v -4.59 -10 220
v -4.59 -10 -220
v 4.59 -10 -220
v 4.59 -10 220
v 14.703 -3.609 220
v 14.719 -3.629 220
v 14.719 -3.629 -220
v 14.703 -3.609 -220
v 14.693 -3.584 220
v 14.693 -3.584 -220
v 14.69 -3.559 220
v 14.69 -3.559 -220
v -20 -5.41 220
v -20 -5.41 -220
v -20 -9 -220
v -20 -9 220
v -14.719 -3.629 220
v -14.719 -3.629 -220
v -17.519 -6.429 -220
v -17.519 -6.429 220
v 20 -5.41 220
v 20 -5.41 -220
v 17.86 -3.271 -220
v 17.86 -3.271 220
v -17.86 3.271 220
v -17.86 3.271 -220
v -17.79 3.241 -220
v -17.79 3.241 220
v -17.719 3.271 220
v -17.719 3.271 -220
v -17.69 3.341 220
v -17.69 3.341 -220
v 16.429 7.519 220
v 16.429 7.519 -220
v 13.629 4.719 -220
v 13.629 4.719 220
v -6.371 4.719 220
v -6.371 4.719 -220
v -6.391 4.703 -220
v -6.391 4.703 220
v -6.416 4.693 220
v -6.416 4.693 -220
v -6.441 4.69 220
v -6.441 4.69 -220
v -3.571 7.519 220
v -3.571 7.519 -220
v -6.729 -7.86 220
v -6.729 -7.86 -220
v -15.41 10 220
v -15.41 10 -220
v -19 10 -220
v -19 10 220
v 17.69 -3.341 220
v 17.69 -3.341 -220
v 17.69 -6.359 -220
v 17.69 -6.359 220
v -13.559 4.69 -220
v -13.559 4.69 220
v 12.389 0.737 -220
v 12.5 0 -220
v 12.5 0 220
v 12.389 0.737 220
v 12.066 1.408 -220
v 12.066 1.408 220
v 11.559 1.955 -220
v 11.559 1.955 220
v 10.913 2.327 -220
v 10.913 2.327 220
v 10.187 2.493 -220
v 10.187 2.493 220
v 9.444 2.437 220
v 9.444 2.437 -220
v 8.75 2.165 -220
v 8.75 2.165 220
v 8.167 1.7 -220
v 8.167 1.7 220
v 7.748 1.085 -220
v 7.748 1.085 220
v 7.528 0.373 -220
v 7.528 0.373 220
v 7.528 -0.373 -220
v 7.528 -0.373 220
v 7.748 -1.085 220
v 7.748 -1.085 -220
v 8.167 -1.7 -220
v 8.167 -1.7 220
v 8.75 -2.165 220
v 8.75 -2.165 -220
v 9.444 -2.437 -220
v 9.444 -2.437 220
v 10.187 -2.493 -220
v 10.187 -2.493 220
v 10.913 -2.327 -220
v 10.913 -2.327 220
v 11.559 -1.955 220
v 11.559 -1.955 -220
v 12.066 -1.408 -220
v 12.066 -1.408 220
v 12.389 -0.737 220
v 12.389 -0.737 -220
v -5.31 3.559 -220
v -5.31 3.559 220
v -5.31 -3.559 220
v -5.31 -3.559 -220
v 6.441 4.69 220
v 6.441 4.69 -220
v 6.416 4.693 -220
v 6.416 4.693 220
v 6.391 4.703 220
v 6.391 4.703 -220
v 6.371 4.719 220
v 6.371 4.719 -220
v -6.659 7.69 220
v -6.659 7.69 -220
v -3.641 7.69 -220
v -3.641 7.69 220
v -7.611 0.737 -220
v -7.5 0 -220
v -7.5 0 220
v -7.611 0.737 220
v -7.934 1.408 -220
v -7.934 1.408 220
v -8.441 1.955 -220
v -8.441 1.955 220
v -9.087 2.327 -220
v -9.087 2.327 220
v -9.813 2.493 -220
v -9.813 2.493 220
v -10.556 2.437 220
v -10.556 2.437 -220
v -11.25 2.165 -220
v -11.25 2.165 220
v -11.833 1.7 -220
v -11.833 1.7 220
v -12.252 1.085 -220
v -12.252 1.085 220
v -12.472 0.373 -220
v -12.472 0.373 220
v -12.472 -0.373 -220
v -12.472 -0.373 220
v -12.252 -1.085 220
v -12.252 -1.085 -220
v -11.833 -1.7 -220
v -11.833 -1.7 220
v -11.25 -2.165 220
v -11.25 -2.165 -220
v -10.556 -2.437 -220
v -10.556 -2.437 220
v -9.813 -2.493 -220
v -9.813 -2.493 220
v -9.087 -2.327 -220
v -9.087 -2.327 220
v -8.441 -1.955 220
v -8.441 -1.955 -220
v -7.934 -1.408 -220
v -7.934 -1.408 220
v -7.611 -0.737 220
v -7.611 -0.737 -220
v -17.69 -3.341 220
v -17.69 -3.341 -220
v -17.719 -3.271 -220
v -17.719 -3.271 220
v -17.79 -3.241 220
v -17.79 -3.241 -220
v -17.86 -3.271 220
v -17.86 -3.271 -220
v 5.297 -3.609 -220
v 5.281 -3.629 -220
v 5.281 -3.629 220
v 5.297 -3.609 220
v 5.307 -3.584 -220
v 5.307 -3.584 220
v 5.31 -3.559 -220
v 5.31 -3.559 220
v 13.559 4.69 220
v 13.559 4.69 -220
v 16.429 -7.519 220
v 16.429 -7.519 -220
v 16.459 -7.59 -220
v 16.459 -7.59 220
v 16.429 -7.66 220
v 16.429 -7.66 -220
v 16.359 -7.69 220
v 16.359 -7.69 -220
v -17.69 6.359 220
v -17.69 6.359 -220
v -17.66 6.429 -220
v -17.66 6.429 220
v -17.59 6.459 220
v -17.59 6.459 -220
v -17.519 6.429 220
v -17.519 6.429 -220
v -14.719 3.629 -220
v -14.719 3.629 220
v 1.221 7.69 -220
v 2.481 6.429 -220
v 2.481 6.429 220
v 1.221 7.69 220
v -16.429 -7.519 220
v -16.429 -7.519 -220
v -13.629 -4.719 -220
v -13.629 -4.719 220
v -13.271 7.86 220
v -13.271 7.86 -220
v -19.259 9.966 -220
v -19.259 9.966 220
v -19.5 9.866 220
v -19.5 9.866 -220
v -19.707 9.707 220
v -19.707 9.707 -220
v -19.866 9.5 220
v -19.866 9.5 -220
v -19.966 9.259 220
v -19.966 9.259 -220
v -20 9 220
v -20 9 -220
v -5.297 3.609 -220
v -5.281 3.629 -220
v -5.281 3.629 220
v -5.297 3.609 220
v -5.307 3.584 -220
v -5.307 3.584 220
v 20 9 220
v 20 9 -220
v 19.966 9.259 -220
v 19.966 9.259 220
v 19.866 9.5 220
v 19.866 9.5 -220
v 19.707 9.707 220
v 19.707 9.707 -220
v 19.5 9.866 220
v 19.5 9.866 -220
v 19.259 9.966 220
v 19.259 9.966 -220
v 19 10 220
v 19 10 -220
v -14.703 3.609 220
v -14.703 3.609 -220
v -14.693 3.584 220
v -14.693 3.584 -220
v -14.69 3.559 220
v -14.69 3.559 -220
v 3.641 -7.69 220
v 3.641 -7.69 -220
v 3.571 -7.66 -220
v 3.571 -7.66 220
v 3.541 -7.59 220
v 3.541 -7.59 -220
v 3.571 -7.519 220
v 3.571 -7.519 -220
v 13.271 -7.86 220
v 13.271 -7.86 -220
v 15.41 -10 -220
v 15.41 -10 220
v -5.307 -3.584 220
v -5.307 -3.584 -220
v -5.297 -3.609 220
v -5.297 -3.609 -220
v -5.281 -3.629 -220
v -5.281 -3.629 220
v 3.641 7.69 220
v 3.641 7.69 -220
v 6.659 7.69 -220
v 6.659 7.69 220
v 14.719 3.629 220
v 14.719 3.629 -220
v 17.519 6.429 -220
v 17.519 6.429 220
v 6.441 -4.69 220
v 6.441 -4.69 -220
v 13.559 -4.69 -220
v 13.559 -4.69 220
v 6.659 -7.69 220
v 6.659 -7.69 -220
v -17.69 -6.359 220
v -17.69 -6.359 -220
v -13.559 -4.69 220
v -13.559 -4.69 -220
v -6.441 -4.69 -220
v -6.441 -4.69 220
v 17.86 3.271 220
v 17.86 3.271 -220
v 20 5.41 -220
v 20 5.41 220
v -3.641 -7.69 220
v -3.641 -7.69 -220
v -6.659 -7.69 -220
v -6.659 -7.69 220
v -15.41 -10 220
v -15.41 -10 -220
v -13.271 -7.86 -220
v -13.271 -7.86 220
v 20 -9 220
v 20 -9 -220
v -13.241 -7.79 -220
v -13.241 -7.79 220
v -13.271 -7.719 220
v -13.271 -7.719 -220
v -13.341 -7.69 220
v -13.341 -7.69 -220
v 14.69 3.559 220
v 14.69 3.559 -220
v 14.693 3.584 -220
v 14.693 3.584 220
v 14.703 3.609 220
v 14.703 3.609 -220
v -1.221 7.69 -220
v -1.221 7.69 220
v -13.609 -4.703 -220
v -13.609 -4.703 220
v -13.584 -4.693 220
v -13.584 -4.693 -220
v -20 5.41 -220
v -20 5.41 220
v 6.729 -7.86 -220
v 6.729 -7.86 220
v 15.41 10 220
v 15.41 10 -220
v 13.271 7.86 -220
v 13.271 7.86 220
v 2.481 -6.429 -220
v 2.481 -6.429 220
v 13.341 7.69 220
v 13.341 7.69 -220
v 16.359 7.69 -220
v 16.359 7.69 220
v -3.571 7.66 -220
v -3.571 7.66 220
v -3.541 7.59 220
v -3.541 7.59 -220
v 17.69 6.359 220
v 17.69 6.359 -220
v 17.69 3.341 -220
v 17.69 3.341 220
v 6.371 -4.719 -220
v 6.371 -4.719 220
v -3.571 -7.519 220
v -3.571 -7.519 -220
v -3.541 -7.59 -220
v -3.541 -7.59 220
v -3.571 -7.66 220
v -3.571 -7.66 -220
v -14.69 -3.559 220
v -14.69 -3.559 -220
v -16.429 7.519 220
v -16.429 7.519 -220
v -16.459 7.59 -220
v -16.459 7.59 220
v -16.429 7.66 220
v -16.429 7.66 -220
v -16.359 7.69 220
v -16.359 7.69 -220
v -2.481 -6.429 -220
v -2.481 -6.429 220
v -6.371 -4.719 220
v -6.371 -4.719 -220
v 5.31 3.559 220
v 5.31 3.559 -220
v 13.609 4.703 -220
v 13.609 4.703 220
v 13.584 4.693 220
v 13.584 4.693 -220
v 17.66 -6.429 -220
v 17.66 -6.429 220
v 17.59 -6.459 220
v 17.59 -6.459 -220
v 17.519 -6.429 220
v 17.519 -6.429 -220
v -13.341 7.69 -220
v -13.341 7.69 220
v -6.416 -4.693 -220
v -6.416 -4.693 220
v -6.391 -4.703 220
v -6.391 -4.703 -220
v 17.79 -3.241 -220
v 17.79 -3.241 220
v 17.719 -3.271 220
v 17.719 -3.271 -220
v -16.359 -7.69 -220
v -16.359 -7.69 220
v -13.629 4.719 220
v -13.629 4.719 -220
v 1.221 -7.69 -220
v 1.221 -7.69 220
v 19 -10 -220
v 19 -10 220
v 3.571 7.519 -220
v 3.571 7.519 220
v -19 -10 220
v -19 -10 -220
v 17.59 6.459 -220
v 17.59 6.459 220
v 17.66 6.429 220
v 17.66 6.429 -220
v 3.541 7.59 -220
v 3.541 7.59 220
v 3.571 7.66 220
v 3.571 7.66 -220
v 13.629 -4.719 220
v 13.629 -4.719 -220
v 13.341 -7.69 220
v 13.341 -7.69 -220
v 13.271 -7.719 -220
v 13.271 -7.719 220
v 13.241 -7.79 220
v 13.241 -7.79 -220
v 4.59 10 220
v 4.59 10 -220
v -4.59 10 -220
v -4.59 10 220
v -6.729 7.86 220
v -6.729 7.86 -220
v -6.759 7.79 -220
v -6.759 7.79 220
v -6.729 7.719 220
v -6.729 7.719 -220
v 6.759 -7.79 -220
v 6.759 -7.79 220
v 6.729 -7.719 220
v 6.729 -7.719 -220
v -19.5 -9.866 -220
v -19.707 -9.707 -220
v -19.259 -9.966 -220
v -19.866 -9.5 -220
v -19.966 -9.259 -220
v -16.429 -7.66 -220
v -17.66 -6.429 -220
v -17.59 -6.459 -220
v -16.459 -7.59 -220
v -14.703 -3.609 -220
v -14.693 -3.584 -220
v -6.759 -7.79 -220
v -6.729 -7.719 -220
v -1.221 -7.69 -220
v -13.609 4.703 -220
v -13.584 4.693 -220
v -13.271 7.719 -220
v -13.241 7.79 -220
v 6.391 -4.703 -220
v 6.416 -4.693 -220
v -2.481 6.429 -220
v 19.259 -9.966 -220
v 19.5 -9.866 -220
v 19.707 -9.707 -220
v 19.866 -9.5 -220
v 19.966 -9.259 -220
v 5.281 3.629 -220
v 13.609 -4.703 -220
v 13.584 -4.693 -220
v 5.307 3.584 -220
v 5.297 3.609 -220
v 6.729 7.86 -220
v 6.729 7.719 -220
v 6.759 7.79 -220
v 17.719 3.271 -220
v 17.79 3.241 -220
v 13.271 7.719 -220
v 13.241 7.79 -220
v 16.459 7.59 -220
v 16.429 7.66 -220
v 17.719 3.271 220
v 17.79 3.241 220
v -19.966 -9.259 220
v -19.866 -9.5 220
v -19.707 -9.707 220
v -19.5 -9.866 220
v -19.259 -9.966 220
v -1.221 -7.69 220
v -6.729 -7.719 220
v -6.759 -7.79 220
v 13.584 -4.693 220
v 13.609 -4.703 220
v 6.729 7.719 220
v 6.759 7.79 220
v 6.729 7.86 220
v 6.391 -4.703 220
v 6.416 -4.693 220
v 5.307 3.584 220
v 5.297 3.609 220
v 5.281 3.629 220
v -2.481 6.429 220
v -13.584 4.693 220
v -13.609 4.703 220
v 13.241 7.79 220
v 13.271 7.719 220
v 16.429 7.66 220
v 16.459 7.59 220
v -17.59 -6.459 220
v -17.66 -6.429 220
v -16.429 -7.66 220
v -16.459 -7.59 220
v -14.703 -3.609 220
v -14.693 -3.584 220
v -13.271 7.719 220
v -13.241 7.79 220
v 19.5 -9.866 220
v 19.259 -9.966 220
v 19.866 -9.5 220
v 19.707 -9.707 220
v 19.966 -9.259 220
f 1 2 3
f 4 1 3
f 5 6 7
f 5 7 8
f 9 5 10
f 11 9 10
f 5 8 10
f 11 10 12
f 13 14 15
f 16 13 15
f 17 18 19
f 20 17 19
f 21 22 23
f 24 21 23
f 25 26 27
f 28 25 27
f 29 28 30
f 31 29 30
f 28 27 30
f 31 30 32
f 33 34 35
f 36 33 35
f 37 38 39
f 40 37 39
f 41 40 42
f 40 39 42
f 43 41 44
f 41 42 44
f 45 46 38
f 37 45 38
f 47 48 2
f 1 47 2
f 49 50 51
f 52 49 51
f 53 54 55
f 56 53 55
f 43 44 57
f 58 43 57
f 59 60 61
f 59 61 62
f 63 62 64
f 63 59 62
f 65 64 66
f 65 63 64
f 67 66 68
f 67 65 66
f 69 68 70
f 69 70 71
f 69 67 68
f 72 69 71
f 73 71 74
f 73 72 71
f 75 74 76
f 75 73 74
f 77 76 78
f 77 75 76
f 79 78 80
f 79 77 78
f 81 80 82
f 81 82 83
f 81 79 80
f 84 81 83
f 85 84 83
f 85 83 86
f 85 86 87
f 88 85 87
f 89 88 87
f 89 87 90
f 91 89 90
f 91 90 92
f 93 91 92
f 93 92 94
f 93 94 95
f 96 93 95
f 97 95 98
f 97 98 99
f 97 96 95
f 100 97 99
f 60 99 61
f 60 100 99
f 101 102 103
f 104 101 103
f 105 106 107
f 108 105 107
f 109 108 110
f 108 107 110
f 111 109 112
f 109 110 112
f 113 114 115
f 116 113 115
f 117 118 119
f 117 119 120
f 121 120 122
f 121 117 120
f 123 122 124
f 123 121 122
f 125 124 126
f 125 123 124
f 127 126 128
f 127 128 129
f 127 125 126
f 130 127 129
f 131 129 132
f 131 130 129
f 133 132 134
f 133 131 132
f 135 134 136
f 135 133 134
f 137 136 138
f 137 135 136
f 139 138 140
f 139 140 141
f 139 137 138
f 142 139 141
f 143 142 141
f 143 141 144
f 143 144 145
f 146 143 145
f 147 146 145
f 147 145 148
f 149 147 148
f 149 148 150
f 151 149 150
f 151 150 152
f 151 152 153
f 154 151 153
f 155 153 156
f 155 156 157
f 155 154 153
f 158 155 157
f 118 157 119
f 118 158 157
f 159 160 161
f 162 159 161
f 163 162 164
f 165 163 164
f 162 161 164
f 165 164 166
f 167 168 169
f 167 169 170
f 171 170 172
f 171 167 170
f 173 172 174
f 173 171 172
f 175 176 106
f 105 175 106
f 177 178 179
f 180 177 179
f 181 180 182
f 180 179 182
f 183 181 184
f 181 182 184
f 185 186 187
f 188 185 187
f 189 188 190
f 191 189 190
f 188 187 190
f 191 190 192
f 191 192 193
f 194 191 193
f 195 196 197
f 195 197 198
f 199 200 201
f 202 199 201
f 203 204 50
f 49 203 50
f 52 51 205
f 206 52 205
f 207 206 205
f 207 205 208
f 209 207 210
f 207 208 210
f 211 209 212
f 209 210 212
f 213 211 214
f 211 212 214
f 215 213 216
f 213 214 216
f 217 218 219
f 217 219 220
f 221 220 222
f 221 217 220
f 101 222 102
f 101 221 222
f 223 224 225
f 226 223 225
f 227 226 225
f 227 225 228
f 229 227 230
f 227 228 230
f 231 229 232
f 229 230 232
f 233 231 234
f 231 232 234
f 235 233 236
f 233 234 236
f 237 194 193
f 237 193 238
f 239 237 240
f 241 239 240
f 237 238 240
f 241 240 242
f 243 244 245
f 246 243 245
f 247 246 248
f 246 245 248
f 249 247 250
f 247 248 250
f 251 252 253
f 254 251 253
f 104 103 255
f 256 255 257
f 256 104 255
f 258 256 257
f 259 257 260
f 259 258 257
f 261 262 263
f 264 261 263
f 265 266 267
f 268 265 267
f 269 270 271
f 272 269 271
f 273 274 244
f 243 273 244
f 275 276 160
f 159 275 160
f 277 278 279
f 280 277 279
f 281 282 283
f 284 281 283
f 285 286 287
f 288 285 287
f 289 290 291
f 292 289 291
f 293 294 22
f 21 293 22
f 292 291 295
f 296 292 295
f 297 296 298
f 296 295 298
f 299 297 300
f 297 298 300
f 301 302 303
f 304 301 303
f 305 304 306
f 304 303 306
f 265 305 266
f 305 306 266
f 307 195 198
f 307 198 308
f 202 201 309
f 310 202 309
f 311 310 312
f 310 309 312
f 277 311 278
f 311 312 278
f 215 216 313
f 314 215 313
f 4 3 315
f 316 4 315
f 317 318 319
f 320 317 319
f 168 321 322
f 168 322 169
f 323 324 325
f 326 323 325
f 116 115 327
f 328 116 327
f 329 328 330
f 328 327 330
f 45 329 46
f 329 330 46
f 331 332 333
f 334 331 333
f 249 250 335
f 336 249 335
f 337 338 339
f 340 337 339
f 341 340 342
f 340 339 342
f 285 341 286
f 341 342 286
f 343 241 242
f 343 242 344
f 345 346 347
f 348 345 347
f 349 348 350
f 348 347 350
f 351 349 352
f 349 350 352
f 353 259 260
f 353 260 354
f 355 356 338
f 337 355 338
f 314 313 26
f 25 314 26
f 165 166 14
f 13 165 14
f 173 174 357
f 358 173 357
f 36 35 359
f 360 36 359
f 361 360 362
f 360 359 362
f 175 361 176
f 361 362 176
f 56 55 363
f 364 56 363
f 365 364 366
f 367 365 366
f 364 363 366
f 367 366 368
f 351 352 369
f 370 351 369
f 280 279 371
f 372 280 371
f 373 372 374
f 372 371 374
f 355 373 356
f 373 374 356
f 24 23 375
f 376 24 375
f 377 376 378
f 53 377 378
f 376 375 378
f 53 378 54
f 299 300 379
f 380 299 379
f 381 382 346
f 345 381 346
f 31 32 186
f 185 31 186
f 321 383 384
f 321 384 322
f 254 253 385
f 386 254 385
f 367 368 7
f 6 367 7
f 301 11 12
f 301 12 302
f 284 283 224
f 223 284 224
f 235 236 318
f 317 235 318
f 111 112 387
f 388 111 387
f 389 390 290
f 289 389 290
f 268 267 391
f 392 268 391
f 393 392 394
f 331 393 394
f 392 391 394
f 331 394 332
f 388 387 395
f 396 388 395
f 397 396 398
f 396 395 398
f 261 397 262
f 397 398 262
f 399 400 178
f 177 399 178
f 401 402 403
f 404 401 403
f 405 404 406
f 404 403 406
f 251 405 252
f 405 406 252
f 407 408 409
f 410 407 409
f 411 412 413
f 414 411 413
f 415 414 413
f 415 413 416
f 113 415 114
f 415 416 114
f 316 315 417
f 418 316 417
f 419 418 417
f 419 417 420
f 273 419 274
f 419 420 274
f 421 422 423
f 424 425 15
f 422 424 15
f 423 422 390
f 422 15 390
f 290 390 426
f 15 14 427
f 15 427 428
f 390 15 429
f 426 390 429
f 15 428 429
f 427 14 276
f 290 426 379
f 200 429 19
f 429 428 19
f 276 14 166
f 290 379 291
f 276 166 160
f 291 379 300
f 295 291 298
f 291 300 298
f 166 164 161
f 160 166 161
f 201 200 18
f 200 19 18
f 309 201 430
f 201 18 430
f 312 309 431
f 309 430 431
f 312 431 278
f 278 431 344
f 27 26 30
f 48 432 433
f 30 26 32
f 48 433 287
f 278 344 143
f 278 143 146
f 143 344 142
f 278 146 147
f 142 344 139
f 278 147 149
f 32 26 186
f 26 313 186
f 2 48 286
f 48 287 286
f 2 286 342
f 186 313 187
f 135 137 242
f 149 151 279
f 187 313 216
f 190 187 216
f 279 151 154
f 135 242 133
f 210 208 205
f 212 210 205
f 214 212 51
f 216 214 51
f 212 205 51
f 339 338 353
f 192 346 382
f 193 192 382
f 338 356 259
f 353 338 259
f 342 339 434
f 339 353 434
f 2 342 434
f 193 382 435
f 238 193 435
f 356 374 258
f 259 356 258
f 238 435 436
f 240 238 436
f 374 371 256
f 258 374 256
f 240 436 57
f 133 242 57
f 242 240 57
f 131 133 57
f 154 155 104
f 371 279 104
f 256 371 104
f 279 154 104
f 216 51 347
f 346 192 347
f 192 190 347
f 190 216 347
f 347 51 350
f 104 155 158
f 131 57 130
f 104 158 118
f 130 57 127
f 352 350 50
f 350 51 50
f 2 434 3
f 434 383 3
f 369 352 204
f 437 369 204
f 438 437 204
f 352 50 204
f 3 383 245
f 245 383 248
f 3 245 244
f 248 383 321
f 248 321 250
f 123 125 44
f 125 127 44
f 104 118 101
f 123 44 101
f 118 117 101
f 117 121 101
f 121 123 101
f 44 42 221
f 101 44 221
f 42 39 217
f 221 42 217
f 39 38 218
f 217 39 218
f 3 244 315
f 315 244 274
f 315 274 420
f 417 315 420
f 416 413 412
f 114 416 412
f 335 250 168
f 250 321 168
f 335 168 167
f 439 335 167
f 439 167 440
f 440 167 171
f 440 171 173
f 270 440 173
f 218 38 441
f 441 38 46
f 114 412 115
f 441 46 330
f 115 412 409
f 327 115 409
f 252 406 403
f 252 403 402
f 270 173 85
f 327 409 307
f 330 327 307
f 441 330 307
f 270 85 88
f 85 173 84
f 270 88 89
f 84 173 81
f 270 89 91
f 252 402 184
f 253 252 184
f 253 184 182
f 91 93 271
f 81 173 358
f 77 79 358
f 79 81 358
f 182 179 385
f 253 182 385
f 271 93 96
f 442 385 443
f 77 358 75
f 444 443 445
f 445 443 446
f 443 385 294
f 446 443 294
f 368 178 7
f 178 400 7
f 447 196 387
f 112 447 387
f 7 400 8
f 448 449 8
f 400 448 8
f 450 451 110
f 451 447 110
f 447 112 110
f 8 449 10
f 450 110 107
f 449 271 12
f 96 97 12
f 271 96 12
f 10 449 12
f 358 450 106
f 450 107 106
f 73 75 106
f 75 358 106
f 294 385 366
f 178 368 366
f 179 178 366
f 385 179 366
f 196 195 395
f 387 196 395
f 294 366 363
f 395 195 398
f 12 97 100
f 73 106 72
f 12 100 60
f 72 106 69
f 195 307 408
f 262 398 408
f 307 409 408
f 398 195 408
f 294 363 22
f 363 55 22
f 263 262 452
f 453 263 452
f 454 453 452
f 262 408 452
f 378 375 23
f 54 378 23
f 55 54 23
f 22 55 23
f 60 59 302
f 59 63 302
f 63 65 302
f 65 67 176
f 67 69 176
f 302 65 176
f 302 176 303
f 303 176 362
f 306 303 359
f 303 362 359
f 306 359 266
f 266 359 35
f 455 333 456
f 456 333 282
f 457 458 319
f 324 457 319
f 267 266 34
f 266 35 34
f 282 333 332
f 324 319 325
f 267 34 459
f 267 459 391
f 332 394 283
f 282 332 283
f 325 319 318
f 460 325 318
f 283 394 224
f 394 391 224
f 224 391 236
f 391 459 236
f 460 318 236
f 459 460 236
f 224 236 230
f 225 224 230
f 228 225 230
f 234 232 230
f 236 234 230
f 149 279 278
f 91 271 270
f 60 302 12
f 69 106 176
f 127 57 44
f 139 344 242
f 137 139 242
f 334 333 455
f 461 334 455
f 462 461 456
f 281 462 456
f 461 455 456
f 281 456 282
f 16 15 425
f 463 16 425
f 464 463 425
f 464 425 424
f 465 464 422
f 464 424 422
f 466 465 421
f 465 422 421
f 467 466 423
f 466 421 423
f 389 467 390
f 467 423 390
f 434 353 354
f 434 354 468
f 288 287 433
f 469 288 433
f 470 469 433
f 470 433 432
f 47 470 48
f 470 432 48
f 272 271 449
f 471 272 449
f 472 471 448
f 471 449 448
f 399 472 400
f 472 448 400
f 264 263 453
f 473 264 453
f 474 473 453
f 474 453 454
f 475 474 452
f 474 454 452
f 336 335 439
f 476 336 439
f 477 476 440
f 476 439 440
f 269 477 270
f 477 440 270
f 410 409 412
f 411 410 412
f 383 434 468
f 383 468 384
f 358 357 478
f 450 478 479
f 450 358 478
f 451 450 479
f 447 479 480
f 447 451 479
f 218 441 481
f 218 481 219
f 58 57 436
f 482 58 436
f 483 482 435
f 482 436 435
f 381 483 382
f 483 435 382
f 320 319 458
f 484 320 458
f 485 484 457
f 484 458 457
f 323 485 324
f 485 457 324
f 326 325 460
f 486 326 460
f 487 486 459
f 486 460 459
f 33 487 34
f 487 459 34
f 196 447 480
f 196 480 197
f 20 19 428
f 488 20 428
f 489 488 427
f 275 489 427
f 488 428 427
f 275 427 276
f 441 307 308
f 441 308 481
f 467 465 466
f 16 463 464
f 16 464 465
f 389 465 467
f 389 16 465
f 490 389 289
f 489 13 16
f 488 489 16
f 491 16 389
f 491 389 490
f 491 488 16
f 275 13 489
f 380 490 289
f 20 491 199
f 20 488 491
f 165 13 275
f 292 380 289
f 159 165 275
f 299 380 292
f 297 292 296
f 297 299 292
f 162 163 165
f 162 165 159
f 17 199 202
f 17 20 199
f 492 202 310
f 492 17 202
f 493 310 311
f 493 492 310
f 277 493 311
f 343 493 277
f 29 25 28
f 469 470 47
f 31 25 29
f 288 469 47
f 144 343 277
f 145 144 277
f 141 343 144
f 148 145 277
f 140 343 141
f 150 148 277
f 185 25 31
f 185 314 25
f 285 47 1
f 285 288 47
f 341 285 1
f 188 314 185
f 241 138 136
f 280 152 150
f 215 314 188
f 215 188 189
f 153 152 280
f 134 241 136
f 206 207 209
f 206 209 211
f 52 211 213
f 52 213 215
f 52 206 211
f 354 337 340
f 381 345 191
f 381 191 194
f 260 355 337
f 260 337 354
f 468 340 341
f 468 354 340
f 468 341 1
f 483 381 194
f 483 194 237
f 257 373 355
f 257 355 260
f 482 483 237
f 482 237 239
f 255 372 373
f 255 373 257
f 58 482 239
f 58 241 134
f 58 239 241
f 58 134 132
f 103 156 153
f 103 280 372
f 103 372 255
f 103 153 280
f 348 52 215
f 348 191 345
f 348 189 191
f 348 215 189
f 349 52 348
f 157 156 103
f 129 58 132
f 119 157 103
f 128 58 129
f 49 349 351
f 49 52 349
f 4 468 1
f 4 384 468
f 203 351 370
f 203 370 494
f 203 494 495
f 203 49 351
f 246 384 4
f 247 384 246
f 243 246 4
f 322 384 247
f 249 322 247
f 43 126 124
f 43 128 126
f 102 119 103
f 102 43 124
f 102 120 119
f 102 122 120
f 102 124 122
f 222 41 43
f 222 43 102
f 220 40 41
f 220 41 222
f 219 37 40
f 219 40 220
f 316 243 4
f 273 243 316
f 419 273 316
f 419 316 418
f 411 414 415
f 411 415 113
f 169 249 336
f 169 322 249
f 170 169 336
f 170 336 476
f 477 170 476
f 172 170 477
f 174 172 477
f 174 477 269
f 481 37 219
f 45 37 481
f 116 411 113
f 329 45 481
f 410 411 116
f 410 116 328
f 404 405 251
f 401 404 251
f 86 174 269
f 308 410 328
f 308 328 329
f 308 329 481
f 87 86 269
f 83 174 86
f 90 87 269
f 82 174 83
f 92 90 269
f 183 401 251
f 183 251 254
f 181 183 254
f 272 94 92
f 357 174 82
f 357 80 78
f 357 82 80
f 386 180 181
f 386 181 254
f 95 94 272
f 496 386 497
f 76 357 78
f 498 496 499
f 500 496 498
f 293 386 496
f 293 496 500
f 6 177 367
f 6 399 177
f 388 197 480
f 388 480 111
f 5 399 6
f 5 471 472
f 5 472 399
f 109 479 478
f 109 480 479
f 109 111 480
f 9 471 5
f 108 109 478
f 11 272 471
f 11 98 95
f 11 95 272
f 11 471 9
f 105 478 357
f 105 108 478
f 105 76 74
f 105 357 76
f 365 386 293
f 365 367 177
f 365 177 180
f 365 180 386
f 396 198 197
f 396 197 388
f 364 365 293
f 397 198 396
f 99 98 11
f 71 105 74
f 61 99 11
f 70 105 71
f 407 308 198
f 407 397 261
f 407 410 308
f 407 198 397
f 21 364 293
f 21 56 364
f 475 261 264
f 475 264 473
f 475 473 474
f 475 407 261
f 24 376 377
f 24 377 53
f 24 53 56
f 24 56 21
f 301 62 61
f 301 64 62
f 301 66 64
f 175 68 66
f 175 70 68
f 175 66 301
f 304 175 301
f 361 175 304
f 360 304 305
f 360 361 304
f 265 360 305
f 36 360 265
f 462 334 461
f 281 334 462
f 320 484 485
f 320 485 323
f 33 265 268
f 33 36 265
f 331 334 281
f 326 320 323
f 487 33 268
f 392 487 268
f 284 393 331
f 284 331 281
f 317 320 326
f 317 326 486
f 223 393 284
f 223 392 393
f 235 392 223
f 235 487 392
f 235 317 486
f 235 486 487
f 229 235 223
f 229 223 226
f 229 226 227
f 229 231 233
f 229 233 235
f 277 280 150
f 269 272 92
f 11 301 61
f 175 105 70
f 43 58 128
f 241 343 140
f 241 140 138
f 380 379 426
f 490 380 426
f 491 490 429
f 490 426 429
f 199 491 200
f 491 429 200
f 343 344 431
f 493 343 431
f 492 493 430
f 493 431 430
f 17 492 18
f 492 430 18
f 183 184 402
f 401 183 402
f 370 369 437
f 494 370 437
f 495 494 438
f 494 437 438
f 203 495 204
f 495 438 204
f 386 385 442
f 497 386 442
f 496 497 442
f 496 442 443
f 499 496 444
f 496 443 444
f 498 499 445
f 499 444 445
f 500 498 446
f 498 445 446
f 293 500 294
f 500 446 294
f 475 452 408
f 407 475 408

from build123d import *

# Parameters (mm, degrees)
CROQUIS4_R                 = 2.5
MIEMBRO_ESTRUCTURAL1_DEPTH = 440


with BuildPart() as part:
    # Croquis4 → Miembro estructural1 (new body)
    with BuildSketch(Plane.XY.offset(-220)):
        with BuildLine():
            Line((-19, -10), (-15.410285706, -10))
            Line((-15.410285706, -10), (-13.270710678, -7.860424973))
            ThreePointArc((-13.270710678, -7.860424973), (-13.249033403, -7.751445951), (-13.341421356, -7.689714294))
            Line((-13.341421356, -7.689714294), (-16.358578644, -7.689714294))
            ThreePointArc((-16.358578644, -7.689714294), (-16.450966597, -7.627982638), (-16.429289322, -7.519003616))
            Line((-16.429289322, -7.519003616), (-13.629289322, -4.719003616))
            ThreePointArc((-13.629289322, -4.719003616), (-13.596846987, -4.697326341), (-13.558578644, -4.689714294))
            Line((-13.558578644, -4.689714294), (-6.441421356, -4.689714294))
            ThreePointArc((-6.441421356, -4.689714294), (-6.403153013, -4.697326341), (-6.370710678, -4.719003616))
            Line((-6.370710678, -4.719003616), (-3.570710678, -7.519003616))
            ThreePointArc((-3.570710678, -7.519003616), (-3.549033403, -7.627982638), (-3.641421356, -7.689714294))
            Line((-3.641421356, -7.689714294), (-6.658578644, -7.689714294))
            ThreePointArc((-6.658578644, -7.689714294), (-6.750966597, -7.751445951), (-6.729289322, -7.860424973))
            Line((-6.729289322, -7.860424973), (-4.589714294, -10))
            Line((-4.589714294, -10), (4.589714294, -10))
            Line((4.589714294, -10), (6.729289322, -7.860424973))
            ThreePointArc((6.729289322, -7.860424973), (6.750966597, -7.751445951), (6.658578644, -7.689714294))
            Line((6.658578644, -7.689714294), (3.641421356, -7.689714294))
            ThreePointArc((3.641421356, -7.689714294), (3.549033403, -7.627982638), (3.570710678, -7.519003616))
            Line((3.570710678, -7.519003616), (6.370710678, -4.719003616))
            ThreePointArc((6.370710678, -4.719003616), (6.403153013, -4.697326341), (6.441421356, -4.689714294))
            Line((6.441421356, -4.689714294), (13.558578644, -4.689714294))
            ThreePointArc((13.558578644, -4.689714294), (13.596846987, -4.697326341), (13.629289322, -4.719003616))
            Line((13.629289322, -4.719003616), (16.429289322, -7.519003616))
            ThreePointArc((16.429289322, -7.519003616), (16.450966597, -7.627982638), (16.358578644, -7.689714294))
            Line((16.358578644, -7.689714294), (13.341421356, -7.689714294))
            ThreePointArc((13.341421356, -7.689714294), (13.249033403, -7.751445951), (13.270710678, -7.860424973))
            Line((13.270710678, -7.860424973), (15.410285706, -10))
            Line((15.410285706, -10), (19, -10))
            ThreePointArc((19, -10), (19.707106781, -9.707106781), (20, -9))
            Line((20, -9), (20, -5.410285706))
            Line((20, -5.410285706), (17.860424973, -3.270710678))
            ThreePointArc((17.860424973, -3.270710678), (17.751445951, -3.249033403), (17.689714294, -3.341421356))
            Line((17.689714294, -3.341421356), (17.689714294, -6.358578644))
            ThreePointArc((17.689714294, -6.358578644), (17.627982638, -6.450966597), (17.519003616, -6.429289322))
            Line((17.519003616, -6.429289322), (14.719003616, -3.629289322))
            ThreePointArc((14.719003616, -3.629289322), (14.697326341, -3.596846987), (14.689714294, -3.558578644))
            Line((14.689714294, -3.558578644), (14.689714294, 3.558578644))
            ThreePointArc((14.689714294, 3.558578644), (14.697326341, 3.596846987), (14.719003616, 3.629289322))
            Line((14.719003616, 3.629289322), (17.519003616, 6.429289322))
            ThreePointArc((17.519003616, 6.429289322), (17.627982638, 6.450966597), (17.689714294, 6.358578644))
            Line((17.689714294, 6.358578644), (17.689714294, 3.341421356))
            ThreePointArc((17.689714294, 3.341421356), (17.751445951, 3.249033403), (17.860424973, 3.270710678))
            Line((17.860424973, 3.270710678), (20, 5.410285706))
            Line((20, 5.410285706), (20, 9))
            ThreePointArc((20, 9), (19.707106781, 9.707106781), (19, 10))
            Line((19, 10), (15.410285706, 10))
            Line((15.410285706, 10), (13.270710678, 7.860424973))
            ThreePointArc((13.270710678, 7.860424973), (13.249033403, 7.751445951), (13.341421356, 7.689714294))
            Line((13.341421356, 7.689714294), (16.358578644, 7.689714294))
            ThreePointArc((16.358578644, 7.689714294), (16.450966597, 7.627982638), (16.429289322, 7.519003616))
            Line((16.429289322, 7.519003616), (13.629289322, 4.719003616))
            ThreePointArc((13.629289322, 4.719003616), (13.596846987, 4.697326341), (13.558578644, 4.689714294))
            Line((13.558578644, 4.689714294), (6.441421356, 4.689714294))
            ThreePointArc((6.441421356, 4.689714294), (6.403153013, 4.697326341), (6.370710678, 4.719003616))
            Line((6.370710678, 4.719003616), (3.570710678, 7.519003616))
            ThreePointArc((3.570710678, 7.519003616), (3.549033403, 7.627982638), (3.641421356, 7.689714294))
            Line((3.641421356, 7.689714294), (6.658578644, 7.689714294))
            ThreePointArc((6.658578644, 7.689714294), (6.750966597, 7.751445951), (6.729289322, 7.860424973))
            Line((6.729289322, 7.860424973), (4.589714294, 10))
            Line((4.589714294, 10), (-4.589714294, 10))
            Line((-4.589714294, 10), (-6.729289322, 7.860424973))
            ThreePointArc((-6.729289322, 7.860424973), (-6.750966597, 7.751445951), (-6.658578644, 7.689714294))
            Line((-6.658578644, 7.689714294), (-3.641421356, 7.689714294))
            ThreePointArc((-3.641421356, 7.689714294), (-3.549033403, 7.627982638), (-3.570710678, 7.519003616))
            Line((-3.570710678, 7.519003616), (-6.370710678, 4.719003616))
            ThreePointArc((-6.370710678, 4.719003616), (-6.403153013, 4.697326341), (-6.441421356, 4.689714294))
            Line((-6.441421356, 4.689714294), (-13.558578644, 4.689714294))
            ThreePointArc((-13.558578644, 4.689714294), (-13.596846987, 4.697326341), (-13.629289322, 4.719003616))
            Line((-13.629289322, 4.719003616), (-16.429289322, 7.519003616))
            ThreePointArc((-16.429289322, 7.519003616), (-16.450966597, 7.627982638), (-16.358578644, 7.689714294))
            Line((-16.358578644, 7.689714294), (-13.341421356, 7.689714294))
            ThreePointArc((-13.341421356, 7.689714294), (-13.249033403, 7.751445951), (-13.270710678, 7.860424973))
            Line((-13.270710678, 7.860424973), (-15.410285706, 10))
            Line((-15.410285706, 10), (-19, 10))
            ThreePointArc((-19, 10), (-19.707106781, 9.707106781), (-20, 9))
            Line((-20, 9), (-20, 5.410285706))
            Line((-20, 5.410285706), (-17.860424973, 3.270710678))
            ThreePointArc((-17.860424973, 3.270710678), (-17.751445951, 3.249033403), (-17.689714294, 3.341421356))
            Line((-17.689714294, 3.341421356), (-17.689714294, 6.358578644))
            ThreePointArc((-17.689714294, 6.358578644), (-17.627982638, 6.450966597), (-17.519003616, 6.429289322))
            Line((-17.519003616, 6.429289322), (-14.719003616, 3.629289322))
            ThreePointArc((-14.719003616, 3.629289322), (-14.697326341, 3.596846987), (-14.689714294, 3.558578644))
            Line((-14.689714294, 3.558578644), (-14.689714294, -3.558578644))
            ThreePointArc((-14.689714294, -3.558578644), (-14.697326341, -3.596846987), (-14.719003616, -3.629289322))
            Line((-14.719003616, -3.629289322), (-17.519003616, -6.429289322))
            ThreePointArc((-17.519003616, -6.429289322), (-17.627982638, -6.450966597), (-17.689714294, -6.358578644))
            Line((-17.689714294, -6.358578644), (-17.689714294, -3.341421356))
            ThreePointArc((-17.689714294, -3.341421356), (-17.751445951, -3.249033403), (-17.860424973, -3.270710678))
            Line((-17.860424973, -3.270710678), (-20, -5.410285706))
            Line((-20, -5.410285706), (-20, -9))
            ThreePointArc((-20, -9), (-19.707106781, -9.707106781), (-19, -10))
        make_face()
        with Locations((-10, 0)):
            Circle(CROQUIS4_R, mode=Mode.SUBTRACT)
        with Locations((10, 0)):
            Circle(CROQUIS4_R, mode=Mode.SUBTRACT)
        with BuildLine():
            Line((-2.480996384, 6.429289322), (-5.280996384, 3.629289322))
            ThreePointArc((-5.280996384, 3.629289322), (-5.302673659, 3.596846987), (-5.310285706, 3.558578644))
            Line((-5.310285706, 3.558578644), (-5.310285706, -3.558578644))
            ThreePointArc((-5.310285706, -3.558578644), (-5.302673659, -3.596846987), (-5.280996384, -3.629289322))
            Line((-5.280996384, -3.629289322), (-2.480996384, -6.429289322))
            Line((-2.480996384, -6.429289322), (-1.220571411, -7.689714294))
            Line((-1.220571411, -7.689714294), (1.220571411, -7.689714294))
            Line((1.220571411, -7.689714294), (2.480996384, -6.429289322))
            Line((2.480996384, -6.429289322), (5.280996384, -3.629289322))
            ThreePointArc((5.280996384, -3.629289322), (5.302673659, -3.596846987), (5.310285706, -3.558578644))
            Line((5.310285706, -3.558578644), (5.310285706, 3.558578644))
            ThreePointArc((5.310285706, 3.558578644), (5.302673659, 3.596846987), (5.280996384, 3.629289322))
            Line((5.280996384, 3.629289322), (2.480996384, 6.429289322))
            Line((2.480996384, 6.429289322), (1.220571411, 7.689714294))
            Line((1.220571411, 7.689714294), (-1.220571411, 7.689714294))
            Line((-1.220571411, 7.689714294), (-2.480996384, 6.429289322))
        make_face(mode=Mode.SUBTRACT)
    extrude(amount=MIEMBRO_ESTRUCTURAL1_DEPTH)


solid = part.part
